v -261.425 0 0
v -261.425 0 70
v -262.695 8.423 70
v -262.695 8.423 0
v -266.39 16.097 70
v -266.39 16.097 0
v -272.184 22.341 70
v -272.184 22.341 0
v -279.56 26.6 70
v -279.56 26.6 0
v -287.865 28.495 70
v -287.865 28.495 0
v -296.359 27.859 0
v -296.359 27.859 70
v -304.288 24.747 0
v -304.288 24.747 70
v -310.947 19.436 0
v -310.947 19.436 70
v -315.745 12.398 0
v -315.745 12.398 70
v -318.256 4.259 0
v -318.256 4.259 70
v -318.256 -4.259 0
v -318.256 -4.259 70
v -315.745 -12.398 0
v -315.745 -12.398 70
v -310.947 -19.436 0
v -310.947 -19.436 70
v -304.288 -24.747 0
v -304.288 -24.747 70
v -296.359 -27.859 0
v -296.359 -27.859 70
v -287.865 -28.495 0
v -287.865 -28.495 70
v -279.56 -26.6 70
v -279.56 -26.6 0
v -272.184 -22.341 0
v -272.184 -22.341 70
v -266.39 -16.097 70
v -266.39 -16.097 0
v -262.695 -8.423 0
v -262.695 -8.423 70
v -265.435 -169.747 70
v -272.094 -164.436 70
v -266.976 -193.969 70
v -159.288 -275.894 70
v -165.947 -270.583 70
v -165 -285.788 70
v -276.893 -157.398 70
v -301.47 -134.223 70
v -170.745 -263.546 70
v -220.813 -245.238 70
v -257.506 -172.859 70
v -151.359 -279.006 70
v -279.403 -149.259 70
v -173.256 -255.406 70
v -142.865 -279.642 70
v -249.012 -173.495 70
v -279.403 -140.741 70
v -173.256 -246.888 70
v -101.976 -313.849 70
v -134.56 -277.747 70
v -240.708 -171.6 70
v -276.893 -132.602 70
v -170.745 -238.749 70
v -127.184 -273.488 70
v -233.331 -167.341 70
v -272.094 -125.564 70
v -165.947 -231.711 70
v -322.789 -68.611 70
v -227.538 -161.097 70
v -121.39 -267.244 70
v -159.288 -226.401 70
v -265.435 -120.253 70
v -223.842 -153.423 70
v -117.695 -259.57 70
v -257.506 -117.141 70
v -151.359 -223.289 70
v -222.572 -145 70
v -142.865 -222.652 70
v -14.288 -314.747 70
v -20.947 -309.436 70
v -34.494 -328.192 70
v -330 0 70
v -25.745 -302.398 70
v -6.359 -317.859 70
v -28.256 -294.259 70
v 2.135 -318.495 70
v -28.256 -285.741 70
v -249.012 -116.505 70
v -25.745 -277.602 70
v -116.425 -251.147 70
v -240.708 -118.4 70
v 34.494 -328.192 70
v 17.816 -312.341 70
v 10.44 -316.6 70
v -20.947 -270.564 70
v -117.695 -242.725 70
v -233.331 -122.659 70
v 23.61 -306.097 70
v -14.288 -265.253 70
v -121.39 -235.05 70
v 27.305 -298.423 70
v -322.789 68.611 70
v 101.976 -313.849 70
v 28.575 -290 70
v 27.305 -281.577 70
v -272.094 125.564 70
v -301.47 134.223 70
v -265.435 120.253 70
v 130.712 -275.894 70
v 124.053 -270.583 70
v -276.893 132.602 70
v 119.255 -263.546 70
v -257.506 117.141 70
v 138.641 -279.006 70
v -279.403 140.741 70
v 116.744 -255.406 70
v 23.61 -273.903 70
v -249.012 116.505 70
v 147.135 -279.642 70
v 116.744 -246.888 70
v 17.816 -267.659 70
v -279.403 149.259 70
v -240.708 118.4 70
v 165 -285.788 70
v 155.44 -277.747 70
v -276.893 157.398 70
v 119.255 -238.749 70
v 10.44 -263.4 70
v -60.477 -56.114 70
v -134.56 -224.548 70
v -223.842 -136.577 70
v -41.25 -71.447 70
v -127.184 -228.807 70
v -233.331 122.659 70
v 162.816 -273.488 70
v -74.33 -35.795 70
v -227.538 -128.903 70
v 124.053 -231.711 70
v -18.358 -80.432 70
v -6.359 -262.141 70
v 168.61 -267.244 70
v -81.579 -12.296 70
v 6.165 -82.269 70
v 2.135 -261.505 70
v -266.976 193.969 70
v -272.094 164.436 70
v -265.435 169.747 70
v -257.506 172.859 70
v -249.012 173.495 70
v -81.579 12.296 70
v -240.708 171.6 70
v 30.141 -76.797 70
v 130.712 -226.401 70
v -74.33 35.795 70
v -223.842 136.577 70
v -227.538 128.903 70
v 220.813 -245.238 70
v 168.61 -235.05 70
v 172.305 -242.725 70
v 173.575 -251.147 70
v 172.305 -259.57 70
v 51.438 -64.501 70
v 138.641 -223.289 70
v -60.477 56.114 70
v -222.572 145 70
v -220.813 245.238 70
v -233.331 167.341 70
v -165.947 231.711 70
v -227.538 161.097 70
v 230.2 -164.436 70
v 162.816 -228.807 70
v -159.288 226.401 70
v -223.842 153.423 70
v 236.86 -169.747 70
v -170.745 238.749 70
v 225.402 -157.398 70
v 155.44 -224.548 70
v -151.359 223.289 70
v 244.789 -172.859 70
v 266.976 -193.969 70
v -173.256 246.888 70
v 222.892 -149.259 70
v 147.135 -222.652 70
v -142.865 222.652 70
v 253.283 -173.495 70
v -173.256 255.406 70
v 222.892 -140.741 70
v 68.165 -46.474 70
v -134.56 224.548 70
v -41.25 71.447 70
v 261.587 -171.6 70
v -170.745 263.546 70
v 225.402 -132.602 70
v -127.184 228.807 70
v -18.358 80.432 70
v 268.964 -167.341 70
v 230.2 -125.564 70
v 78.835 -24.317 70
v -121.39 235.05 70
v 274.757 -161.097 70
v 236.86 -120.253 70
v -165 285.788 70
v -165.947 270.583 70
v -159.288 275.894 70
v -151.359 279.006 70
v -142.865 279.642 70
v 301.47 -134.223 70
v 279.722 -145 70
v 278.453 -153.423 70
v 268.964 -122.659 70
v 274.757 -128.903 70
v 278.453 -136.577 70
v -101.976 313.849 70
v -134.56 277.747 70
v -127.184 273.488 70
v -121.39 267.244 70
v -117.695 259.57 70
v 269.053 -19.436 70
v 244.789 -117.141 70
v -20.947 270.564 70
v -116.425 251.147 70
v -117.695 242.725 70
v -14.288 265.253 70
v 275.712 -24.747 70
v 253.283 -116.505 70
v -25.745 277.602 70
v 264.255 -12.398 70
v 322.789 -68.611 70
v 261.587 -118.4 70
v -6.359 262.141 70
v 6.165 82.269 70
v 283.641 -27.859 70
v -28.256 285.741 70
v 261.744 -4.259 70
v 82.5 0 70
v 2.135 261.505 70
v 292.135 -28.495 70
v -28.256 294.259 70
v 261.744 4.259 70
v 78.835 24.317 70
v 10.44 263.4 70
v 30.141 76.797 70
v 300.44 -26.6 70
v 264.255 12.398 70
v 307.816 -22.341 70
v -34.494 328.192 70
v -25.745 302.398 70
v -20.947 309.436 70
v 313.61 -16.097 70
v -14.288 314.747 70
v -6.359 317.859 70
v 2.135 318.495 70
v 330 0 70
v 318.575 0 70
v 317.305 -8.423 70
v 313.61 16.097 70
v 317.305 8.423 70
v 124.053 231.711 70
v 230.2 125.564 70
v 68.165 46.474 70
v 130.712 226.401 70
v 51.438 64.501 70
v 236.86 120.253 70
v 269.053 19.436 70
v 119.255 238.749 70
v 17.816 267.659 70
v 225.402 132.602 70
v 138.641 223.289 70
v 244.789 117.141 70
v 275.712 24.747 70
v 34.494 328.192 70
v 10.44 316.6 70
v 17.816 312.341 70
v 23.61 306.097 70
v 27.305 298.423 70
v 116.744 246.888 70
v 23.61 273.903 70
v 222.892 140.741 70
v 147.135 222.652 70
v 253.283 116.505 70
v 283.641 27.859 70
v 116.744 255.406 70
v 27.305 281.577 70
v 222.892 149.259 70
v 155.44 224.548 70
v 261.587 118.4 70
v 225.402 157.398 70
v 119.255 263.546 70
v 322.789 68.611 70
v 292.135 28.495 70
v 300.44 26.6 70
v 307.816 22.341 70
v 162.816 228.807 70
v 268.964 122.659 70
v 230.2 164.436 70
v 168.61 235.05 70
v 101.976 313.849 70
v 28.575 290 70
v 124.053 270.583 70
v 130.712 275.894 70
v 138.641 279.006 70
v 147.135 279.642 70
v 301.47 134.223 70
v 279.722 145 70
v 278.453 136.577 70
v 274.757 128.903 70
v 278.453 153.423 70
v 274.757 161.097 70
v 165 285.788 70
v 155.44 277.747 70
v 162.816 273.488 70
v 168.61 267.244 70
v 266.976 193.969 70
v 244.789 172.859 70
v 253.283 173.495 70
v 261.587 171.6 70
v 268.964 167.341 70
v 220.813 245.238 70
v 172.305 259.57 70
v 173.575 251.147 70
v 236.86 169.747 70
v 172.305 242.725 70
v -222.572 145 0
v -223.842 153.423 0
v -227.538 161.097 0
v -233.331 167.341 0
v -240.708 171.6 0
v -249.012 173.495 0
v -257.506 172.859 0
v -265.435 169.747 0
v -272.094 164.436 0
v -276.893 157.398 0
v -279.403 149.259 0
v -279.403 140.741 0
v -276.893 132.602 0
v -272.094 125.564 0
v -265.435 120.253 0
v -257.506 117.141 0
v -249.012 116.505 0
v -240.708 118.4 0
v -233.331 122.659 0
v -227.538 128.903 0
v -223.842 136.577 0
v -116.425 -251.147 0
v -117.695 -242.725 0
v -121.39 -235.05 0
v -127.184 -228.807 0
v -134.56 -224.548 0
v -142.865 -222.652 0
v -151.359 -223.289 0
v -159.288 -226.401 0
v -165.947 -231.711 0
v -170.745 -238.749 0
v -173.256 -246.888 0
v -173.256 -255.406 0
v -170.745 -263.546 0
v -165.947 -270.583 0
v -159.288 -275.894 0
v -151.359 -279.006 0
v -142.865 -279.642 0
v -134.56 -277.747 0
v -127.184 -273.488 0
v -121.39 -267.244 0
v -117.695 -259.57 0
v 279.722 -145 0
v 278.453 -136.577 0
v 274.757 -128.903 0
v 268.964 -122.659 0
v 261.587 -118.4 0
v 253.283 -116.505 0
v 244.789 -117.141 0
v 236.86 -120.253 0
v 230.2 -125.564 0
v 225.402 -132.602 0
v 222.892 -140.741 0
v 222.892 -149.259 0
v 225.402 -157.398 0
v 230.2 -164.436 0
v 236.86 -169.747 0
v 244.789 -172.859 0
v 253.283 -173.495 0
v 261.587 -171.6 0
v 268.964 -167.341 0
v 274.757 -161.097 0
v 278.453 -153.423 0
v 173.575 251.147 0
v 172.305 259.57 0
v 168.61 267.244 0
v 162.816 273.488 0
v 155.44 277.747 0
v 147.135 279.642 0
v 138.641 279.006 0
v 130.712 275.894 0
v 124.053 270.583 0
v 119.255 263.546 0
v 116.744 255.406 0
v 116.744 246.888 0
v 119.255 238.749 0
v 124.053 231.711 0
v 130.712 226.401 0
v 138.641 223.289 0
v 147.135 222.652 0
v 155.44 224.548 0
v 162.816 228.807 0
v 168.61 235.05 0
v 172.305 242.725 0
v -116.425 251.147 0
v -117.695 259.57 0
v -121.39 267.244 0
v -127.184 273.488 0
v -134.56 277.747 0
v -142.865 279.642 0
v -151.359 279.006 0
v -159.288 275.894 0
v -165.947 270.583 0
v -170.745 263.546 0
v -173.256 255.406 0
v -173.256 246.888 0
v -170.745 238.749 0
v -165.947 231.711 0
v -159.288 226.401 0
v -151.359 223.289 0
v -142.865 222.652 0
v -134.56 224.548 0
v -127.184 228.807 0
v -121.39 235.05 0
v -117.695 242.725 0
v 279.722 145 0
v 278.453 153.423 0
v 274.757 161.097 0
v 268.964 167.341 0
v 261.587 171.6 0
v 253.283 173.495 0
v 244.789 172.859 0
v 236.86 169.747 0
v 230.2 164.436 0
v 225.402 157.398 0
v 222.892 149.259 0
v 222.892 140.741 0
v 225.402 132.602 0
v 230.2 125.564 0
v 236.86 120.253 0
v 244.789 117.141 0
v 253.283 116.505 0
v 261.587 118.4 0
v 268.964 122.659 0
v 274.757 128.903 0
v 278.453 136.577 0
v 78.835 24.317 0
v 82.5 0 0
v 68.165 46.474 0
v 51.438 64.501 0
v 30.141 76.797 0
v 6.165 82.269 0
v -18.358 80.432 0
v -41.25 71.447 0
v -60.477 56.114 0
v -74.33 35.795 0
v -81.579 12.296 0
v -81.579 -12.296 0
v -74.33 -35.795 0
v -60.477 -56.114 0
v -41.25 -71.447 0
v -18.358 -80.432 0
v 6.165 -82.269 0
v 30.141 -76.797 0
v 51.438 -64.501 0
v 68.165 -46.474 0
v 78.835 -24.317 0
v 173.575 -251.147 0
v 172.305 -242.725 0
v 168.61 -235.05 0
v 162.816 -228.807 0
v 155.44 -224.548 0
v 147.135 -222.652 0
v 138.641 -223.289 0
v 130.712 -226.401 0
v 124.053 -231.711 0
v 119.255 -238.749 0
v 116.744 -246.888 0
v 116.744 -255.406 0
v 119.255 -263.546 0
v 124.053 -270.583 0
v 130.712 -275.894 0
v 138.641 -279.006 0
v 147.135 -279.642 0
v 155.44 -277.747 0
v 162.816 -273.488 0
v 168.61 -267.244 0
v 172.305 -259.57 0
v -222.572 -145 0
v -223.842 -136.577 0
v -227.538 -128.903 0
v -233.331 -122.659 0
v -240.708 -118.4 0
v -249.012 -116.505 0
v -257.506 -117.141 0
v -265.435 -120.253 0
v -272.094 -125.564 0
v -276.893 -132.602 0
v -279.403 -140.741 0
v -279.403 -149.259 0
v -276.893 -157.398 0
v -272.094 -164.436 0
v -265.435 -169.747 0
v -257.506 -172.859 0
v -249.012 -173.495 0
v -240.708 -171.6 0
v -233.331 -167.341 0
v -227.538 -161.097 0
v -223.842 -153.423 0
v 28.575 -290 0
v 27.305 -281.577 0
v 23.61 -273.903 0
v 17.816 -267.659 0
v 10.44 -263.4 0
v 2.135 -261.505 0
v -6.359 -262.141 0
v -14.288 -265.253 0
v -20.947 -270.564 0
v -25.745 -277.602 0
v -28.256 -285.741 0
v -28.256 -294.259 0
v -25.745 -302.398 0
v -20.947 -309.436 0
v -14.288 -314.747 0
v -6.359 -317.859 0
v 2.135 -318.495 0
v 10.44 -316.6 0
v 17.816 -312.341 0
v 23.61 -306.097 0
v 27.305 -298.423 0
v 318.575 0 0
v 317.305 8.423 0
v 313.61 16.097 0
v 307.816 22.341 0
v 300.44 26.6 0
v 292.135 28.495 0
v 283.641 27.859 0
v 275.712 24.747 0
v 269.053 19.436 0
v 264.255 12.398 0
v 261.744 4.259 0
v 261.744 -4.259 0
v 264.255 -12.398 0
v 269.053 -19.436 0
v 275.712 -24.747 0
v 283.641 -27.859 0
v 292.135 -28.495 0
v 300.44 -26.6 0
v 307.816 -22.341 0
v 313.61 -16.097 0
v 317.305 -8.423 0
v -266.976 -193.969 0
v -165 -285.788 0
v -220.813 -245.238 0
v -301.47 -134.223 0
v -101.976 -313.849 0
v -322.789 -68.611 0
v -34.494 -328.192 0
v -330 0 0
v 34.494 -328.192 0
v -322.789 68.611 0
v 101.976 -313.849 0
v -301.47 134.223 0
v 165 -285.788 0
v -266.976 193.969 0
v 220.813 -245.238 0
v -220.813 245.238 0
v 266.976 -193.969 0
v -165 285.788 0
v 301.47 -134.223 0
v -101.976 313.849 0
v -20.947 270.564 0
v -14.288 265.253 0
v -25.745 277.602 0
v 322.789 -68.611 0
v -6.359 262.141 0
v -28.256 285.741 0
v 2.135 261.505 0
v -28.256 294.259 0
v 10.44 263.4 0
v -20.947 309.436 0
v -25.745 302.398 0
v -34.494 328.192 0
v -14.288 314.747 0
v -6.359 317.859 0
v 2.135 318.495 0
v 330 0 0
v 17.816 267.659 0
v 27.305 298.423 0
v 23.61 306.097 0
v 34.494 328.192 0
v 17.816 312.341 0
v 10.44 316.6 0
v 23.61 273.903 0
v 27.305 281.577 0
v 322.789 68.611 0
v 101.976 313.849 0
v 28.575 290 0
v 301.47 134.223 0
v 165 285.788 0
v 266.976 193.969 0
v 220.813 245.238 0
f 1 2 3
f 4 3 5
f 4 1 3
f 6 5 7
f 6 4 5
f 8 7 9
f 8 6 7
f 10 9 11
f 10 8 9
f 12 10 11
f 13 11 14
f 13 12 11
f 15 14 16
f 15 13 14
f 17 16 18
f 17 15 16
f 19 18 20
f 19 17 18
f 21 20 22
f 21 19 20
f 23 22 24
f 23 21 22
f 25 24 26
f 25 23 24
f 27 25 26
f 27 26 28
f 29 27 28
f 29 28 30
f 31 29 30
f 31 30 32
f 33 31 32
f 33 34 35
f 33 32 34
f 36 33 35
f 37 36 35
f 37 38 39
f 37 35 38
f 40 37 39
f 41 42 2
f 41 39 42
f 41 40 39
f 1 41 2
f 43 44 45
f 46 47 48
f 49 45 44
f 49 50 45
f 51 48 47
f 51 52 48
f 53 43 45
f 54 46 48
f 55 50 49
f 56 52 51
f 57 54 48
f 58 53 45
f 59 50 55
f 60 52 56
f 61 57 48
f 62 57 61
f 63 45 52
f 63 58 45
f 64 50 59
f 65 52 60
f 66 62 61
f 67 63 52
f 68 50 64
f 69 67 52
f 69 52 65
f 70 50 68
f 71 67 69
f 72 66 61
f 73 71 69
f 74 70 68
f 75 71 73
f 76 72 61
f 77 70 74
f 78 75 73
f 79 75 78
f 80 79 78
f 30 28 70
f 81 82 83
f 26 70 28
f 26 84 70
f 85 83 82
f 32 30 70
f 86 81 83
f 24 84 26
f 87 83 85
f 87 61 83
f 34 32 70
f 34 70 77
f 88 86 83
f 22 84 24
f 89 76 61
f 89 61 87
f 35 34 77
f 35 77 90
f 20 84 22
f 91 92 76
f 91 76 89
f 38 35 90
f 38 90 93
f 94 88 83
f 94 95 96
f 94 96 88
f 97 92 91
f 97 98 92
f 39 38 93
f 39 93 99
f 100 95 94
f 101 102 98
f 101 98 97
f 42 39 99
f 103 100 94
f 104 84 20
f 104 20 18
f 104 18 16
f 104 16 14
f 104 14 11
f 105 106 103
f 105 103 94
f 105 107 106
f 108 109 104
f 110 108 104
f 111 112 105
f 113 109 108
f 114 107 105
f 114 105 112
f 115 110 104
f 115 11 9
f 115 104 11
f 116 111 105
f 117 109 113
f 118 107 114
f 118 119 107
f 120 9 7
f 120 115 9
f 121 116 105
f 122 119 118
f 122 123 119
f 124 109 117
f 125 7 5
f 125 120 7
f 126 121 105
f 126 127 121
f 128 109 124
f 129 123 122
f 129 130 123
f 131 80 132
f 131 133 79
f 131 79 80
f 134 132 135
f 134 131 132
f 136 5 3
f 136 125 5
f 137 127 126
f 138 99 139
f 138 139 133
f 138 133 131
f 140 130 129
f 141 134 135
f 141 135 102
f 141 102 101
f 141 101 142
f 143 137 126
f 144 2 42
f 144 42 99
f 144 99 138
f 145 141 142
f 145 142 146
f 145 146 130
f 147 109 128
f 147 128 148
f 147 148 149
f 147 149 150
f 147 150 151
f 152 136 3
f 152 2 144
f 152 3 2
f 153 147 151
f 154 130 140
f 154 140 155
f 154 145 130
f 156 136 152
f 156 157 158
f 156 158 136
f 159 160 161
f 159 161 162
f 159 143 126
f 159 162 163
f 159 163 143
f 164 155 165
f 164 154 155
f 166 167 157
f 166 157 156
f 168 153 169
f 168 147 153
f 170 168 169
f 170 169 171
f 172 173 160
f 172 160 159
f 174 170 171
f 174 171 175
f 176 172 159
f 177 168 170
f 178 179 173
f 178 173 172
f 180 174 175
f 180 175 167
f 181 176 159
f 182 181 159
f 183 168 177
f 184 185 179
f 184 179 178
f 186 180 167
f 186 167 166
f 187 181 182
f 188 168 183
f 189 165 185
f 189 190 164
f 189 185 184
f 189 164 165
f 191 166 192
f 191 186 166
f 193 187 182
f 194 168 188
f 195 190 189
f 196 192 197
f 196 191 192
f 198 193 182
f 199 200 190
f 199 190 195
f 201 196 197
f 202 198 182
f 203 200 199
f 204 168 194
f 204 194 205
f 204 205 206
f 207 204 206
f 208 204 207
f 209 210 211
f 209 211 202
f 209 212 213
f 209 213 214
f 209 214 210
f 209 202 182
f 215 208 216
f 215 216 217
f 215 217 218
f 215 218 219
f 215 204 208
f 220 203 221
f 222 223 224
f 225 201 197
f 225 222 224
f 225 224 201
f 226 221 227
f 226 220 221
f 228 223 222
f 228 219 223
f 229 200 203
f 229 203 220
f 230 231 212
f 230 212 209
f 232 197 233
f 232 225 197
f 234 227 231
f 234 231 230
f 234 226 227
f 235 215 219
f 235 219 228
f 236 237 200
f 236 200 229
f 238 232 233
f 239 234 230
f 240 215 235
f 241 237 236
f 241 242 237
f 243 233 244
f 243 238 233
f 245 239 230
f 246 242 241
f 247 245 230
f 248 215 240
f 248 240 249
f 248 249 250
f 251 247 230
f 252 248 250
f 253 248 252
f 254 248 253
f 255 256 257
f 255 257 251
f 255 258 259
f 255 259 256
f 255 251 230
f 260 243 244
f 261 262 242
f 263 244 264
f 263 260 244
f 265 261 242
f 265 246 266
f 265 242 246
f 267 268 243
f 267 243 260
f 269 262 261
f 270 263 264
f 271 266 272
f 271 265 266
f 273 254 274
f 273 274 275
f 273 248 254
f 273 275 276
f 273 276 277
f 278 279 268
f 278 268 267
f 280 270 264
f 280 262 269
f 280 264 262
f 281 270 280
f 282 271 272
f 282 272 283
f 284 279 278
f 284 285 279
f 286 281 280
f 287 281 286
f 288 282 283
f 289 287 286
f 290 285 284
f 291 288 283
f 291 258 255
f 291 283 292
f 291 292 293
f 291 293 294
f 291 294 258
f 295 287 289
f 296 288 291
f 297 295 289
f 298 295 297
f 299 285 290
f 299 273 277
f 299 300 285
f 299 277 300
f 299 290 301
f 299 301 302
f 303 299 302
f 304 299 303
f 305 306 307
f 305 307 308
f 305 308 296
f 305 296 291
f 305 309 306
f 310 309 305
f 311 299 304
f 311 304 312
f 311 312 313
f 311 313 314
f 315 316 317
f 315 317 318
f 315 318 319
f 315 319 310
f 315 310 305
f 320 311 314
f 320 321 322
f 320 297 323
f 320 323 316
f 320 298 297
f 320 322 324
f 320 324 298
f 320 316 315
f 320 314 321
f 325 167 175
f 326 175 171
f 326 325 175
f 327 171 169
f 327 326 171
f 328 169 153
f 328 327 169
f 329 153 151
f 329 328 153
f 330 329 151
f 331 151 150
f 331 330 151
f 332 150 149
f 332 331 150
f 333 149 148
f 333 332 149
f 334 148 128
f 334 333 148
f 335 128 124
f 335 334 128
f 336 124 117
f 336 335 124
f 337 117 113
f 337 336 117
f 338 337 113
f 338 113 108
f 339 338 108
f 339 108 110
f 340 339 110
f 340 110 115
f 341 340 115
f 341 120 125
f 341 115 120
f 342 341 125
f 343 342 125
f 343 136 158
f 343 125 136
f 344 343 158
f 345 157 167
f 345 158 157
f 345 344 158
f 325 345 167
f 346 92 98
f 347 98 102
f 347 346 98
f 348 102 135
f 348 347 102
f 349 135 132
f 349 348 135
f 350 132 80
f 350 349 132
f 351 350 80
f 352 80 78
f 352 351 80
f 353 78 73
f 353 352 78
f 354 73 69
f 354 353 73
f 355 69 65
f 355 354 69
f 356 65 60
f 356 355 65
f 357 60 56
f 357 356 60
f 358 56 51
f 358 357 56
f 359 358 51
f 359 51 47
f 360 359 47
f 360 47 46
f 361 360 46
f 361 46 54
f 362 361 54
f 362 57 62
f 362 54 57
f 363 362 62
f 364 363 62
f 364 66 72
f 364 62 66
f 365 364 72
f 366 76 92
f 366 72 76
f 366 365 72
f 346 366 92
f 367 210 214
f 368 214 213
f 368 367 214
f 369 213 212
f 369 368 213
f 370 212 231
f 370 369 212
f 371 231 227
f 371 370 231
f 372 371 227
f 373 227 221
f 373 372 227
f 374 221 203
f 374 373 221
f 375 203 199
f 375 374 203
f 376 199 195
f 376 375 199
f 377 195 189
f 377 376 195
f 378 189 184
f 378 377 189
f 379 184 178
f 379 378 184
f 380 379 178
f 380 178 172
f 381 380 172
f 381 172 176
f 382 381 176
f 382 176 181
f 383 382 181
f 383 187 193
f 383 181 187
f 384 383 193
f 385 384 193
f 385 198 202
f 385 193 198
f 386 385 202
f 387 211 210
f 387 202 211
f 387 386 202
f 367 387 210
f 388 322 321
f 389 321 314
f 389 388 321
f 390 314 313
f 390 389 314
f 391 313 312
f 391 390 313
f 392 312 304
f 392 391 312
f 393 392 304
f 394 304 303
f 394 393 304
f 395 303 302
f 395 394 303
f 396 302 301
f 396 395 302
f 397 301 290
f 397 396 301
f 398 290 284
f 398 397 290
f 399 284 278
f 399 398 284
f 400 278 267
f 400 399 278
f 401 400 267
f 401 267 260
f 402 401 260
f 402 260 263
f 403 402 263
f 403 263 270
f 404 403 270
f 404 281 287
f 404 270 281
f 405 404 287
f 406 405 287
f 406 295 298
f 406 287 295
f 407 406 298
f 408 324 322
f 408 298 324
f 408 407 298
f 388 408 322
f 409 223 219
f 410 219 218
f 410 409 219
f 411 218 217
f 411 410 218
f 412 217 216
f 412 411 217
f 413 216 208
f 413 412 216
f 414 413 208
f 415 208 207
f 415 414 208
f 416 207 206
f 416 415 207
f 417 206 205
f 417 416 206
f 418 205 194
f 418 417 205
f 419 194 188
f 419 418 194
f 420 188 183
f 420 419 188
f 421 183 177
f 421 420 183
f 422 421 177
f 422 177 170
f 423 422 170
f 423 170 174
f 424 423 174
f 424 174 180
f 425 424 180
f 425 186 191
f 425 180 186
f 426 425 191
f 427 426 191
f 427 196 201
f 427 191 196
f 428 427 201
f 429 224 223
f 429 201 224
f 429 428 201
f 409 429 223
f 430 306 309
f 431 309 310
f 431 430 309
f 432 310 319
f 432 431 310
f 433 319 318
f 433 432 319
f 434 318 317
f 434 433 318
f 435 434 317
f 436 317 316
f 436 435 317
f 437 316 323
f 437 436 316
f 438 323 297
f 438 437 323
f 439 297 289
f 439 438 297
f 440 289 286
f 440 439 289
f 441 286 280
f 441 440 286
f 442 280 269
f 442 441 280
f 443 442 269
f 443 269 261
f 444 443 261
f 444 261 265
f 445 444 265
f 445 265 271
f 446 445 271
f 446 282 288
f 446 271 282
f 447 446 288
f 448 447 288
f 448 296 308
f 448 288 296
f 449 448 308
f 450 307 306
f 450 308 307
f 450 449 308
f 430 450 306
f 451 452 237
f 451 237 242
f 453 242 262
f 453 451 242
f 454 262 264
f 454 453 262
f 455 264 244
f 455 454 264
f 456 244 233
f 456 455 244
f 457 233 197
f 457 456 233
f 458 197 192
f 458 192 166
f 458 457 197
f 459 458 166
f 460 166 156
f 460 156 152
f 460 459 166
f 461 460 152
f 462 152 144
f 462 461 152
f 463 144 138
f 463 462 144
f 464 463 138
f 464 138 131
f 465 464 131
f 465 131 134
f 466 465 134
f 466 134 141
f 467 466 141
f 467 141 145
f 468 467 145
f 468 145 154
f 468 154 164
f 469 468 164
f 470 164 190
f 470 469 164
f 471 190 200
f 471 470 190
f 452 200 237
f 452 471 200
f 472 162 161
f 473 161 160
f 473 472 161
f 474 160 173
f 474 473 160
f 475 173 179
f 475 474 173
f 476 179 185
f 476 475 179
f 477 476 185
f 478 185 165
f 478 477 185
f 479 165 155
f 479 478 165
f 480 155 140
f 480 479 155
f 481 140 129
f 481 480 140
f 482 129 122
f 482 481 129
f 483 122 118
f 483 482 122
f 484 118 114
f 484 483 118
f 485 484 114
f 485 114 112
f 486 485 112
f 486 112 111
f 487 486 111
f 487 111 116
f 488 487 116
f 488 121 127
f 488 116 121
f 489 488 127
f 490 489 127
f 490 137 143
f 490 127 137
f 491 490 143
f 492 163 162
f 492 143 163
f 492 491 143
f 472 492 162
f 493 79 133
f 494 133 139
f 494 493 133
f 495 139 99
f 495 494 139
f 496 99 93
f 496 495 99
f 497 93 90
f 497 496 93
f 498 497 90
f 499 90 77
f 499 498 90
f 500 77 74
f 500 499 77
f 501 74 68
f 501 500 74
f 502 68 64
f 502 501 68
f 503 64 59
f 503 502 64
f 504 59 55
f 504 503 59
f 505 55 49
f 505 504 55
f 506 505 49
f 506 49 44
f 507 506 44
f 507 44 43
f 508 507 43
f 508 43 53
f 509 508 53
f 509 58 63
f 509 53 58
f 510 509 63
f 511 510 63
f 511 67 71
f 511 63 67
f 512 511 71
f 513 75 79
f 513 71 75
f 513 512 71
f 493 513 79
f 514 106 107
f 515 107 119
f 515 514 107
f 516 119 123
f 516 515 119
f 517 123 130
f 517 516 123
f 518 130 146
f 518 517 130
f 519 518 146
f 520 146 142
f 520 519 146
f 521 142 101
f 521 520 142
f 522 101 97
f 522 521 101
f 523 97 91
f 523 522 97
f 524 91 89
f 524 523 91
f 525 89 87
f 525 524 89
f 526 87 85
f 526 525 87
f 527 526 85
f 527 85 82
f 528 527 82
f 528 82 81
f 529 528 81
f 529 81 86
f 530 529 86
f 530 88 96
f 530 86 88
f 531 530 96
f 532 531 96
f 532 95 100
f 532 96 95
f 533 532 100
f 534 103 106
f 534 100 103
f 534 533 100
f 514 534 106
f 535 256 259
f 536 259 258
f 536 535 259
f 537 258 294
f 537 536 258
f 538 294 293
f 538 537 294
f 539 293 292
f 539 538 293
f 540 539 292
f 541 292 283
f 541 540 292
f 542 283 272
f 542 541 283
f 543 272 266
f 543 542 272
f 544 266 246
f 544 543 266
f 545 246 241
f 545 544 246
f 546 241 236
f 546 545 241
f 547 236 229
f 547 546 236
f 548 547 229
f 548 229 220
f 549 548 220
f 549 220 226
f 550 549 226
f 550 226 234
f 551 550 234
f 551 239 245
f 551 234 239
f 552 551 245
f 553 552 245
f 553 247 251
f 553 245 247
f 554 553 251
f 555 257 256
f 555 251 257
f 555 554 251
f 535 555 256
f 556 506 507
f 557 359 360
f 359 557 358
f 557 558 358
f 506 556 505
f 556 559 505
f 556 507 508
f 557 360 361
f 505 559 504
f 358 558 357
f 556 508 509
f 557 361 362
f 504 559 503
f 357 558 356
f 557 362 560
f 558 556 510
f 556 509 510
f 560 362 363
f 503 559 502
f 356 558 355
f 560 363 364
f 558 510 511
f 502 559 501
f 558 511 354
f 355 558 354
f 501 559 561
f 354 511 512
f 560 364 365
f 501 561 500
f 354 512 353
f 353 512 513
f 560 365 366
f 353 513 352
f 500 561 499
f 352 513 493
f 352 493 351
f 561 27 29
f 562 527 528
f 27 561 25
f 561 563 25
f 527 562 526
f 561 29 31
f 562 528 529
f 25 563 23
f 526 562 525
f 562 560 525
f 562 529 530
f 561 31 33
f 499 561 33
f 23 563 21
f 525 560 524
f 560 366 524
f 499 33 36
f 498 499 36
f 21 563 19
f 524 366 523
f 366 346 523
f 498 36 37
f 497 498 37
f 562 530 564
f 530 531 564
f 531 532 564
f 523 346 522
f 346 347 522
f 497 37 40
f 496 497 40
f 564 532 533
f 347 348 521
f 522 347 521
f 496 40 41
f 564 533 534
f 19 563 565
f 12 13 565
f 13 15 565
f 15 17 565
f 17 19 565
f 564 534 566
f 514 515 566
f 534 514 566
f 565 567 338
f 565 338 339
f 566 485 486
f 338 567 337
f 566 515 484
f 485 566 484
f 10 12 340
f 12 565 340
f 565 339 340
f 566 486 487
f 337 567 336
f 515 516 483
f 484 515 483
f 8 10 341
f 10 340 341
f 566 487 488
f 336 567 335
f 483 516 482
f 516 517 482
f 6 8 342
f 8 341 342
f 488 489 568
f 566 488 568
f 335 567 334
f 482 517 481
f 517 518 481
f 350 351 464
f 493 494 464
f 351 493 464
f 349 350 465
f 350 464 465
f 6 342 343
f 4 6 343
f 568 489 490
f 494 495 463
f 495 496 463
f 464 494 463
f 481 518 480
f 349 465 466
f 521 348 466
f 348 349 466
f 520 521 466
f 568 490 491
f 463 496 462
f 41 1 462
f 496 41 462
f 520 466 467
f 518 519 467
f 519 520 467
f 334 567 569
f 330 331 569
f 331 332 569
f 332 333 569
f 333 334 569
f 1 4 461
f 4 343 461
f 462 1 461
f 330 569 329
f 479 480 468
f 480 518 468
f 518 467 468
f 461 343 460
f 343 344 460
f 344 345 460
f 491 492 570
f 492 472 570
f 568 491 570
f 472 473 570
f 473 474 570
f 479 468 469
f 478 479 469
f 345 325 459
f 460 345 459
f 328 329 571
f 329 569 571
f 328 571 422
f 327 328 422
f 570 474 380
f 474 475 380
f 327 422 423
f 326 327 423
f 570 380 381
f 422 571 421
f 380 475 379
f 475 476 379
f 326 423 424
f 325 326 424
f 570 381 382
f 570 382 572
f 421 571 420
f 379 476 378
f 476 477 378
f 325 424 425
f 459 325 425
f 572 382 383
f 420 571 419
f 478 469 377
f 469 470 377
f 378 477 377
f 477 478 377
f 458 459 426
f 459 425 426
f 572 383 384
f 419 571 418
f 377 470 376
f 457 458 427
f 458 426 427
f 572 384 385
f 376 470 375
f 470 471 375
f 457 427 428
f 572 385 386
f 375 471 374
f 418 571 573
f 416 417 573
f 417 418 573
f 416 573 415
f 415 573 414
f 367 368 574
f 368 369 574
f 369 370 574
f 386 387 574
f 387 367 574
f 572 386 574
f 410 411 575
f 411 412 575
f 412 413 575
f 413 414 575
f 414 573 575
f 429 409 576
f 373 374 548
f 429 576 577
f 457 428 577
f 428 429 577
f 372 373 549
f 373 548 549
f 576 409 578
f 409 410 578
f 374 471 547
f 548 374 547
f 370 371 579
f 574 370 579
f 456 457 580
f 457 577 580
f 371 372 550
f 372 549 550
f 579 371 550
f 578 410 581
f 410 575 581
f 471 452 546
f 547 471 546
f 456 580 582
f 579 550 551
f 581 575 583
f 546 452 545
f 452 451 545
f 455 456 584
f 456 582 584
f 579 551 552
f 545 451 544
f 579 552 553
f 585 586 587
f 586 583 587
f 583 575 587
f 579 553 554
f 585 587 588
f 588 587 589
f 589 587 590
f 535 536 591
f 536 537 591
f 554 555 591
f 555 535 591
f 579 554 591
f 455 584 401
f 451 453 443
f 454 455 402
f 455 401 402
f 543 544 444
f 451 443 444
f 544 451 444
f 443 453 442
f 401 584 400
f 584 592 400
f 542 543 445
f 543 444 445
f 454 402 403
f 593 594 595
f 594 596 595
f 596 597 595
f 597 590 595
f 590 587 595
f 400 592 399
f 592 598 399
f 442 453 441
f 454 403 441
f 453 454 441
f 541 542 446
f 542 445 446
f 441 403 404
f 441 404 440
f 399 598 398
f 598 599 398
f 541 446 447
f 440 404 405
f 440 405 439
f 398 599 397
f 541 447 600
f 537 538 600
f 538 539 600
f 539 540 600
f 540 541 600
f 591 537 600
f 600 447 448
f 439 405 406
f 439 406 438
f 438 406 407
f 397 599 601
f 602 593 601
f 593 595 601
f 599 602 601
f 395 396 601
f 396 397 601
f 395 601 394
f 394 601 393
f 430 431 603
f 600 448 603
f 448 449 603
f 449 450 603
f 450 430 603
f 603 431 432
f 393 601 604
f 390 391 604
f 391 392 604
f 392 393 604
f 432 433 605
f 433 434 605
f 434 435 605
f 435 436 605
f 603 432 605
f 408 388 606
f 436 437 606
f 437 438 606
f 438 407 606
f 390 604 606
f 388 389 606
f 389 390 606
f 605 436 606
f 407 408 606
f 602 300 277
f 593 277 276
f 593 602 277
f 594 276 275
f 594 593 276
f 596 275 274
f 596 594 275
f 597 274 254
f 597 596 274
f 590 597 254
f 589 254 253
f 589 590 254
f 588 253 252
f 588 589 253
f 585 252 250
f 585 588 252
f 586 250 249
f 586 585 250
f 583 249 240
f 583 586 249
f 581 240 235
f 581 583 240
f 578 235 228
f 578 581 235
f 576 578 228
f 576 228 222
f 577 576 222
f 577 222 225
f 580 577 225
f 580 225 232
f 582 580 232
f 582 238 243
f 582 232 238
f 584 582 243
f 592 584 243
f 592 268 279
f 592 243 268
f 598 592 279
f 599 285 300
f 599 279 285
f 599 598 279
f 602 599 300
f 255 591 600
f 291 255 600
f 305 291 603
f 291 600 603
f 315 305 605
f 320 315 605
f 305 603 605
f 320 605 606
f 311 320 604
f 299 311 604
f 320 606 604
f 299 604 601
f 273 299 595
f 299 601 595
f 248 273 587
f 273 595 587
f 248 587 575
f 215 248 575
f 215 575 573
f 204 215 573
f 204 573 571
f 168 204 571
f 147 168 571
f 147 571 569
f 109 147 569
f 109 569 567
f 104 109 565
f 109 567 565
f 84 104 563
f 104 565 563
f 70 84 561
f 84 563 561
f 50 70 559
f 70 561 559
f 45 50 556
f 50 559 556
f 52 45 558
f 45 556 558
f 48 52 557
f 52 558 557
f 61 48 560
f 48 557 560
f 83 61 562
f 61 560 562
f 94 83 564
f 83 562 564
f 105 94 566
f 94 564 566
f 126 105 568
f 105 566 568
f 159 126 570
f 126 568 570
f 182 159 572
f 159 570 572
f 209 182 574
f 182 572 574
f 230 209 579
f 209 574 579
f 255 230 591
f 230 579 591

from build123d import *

# Parameters (mm, degrees)
SKETCH1_R           = 330
SKETCH1_R_2         = 82.5
BOSS_EXTRUDE1_DEPTH = 70
SKETCH2_R           = 28.575
CUT_EXTRUDE1_DEPTH  = 131


with BuildPart() as part:
    # Sketch1 → Boss-Extrude1 (new body)
    with BuildSketch(Plane.XY):
        Circle(SKETCH1_R)
        Circle(SKETCH1_R_2, mode=Mode.SUBTRACT)
    extrude(amount=BOSS_EXTRUDE1_DEPTH)

    # Sketch2 → Cut-Extrude1 (cut)
    with BuildSketch(Plane.XY):
        with Locations((0, 290)):
            Circle(SKETCH2_R)
        with Locations((145, 251.147367097)):
            Circle(SKETCH2_R)
        with Locations((251.147367097, 145)):
            Circle(SKETCH2_R)
        with Locations((290, 0)):
            Circle(SKETCH2_R)
        with Locations((251.147367098, -145)):
            Circle(SKETCH2_R)
        with Locations((145, -251.147367097)):
            Circle(SKETCH2_R)
        with Locations((0, -290)):
            Circle(SKETCH2_R)
        with Locations((-145, -251.147367097)):
            Circle(SKETCH2_R)
        with Locations((-251.147367097, -145)):
            Circle(SKETCH2_R)
        with Locations((-290, 0)):
            Circle(SKETCH2_R)
        with Locations((-251.147367097, 145)):
            Circle(SKETCH2_R)
        with Locations((-145, 251.147367097)):
            Circle(SKETCH2_R)
    extrude(amount=CUT_EXTRUDE1_DEPTH, mode=Mode.SUBTRACT)


solid = part.part
